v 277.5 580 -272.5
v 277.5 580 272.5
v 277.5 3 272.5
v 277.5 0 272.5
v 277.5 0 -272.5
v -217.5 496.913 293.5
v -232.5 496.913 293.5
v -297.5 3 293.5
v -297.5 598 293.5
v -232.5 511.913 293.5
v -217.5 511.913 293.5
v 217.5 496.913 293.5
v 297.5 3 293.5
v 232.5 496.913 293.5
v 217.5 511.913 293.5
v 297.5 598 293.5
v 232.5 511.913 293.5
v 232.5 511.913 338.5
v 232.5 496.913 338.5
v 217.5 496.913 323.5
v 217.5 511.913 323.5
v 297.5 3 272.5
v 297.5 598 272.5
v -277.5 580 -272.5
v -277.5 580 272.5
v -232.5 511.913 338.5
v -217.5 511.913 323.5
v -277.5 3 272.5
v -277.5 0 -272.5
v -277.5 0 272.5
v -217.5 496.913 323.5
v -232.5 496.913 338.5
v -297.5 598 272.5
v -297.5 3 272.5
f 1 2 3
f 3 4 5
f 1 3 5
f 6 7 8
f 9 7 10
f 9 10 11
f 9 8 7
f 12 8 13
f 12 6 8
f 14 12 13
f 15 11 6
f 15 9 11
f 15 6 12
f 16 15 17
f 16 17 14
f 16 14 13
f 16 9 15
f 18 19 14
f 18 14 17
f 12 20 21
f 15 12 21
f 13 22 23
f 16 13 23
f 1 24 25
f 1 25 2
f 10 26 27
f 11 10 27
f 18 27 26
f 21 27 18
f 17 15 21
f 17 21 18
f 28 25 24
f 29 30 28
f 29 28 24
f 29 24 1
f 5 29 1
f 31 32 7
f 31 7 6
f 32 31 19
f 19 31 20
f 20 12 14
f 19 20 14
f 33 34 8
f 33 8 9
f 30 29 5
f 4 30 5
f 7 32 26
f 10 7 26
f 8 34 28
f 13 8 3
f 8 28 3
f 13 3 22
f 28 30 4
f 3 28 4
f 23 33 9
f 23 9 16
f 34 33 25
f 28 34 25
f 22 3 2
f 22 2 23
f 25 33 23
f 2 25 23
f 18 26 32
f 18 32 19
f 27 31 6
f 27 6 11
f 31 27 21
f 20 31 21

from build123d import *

# Parameters (mm, degrees)
SKETCH_1_W      = 555
SKETCH_1_H      = 545
EXTRUDE_1_DEPTH = 580
SKETCH_2_W      = 595
SKETCH_2_H      = 595
EXTRUDE_2_DEPTH = 21
SKETCH_3_W      = 15
SKETCH_3_H      = 15
EXTRUDE_3_DEPTH = 30
SKETCH_4_W      = 465
SKETCH_4_H      = 15
EXTRUDE_4_DEPTH = 15


with BuildPart() as part:
    # Эскиз1 → Бобышка-Вытянуть1 (new body)
    with BuildSketch(Plane(origin=(0, 0, 0), x_dir=(1, 0, 0), z_dir=(0, 1, 0))):
        Rectangle(SKETCH_1_W, SKETCH_1_H)
    extrude(amount=EXTRUDE_1_DEPTH)

    # Эскиз2 → Бобышка-Вытянуть2 (add)
    with BuildSketch(Plane.XY.offset(272.5)):
        with Locations((0, 300.5)):
            Rectangle(SKETCH_2_W, SKETCH_2_H)
    extrude(amount=EXTRUDE_2_DEPTH)

    # Эскиз3 → Бобышка-Вытянуть3 (add)
    with BuildSketch(Plane.XY.offset(293.5)):
        with Locations((-225, 504.413440556)):
            Rectangle(SKETCH_3_W, SKETCH_3_H)
        with Locations((225, 504.413440556)):
            Rectangle(SKETCH_3_W, SKETCH_3_H)
    extrude(amount=EXTRUDE_3_DEPTH)

    # Эскиз4 → Бобышка-Вытянуть4 (add)
    with BuildSketch(Plane.XY.offset(323.5)):
        with Locations((0, 504.413440556)):
            Rectangle(SKETCH_4_W, SKETCH_4_H)
    extrude(amount=EXTRUDE_4_DEPTH)


solid = part.part
